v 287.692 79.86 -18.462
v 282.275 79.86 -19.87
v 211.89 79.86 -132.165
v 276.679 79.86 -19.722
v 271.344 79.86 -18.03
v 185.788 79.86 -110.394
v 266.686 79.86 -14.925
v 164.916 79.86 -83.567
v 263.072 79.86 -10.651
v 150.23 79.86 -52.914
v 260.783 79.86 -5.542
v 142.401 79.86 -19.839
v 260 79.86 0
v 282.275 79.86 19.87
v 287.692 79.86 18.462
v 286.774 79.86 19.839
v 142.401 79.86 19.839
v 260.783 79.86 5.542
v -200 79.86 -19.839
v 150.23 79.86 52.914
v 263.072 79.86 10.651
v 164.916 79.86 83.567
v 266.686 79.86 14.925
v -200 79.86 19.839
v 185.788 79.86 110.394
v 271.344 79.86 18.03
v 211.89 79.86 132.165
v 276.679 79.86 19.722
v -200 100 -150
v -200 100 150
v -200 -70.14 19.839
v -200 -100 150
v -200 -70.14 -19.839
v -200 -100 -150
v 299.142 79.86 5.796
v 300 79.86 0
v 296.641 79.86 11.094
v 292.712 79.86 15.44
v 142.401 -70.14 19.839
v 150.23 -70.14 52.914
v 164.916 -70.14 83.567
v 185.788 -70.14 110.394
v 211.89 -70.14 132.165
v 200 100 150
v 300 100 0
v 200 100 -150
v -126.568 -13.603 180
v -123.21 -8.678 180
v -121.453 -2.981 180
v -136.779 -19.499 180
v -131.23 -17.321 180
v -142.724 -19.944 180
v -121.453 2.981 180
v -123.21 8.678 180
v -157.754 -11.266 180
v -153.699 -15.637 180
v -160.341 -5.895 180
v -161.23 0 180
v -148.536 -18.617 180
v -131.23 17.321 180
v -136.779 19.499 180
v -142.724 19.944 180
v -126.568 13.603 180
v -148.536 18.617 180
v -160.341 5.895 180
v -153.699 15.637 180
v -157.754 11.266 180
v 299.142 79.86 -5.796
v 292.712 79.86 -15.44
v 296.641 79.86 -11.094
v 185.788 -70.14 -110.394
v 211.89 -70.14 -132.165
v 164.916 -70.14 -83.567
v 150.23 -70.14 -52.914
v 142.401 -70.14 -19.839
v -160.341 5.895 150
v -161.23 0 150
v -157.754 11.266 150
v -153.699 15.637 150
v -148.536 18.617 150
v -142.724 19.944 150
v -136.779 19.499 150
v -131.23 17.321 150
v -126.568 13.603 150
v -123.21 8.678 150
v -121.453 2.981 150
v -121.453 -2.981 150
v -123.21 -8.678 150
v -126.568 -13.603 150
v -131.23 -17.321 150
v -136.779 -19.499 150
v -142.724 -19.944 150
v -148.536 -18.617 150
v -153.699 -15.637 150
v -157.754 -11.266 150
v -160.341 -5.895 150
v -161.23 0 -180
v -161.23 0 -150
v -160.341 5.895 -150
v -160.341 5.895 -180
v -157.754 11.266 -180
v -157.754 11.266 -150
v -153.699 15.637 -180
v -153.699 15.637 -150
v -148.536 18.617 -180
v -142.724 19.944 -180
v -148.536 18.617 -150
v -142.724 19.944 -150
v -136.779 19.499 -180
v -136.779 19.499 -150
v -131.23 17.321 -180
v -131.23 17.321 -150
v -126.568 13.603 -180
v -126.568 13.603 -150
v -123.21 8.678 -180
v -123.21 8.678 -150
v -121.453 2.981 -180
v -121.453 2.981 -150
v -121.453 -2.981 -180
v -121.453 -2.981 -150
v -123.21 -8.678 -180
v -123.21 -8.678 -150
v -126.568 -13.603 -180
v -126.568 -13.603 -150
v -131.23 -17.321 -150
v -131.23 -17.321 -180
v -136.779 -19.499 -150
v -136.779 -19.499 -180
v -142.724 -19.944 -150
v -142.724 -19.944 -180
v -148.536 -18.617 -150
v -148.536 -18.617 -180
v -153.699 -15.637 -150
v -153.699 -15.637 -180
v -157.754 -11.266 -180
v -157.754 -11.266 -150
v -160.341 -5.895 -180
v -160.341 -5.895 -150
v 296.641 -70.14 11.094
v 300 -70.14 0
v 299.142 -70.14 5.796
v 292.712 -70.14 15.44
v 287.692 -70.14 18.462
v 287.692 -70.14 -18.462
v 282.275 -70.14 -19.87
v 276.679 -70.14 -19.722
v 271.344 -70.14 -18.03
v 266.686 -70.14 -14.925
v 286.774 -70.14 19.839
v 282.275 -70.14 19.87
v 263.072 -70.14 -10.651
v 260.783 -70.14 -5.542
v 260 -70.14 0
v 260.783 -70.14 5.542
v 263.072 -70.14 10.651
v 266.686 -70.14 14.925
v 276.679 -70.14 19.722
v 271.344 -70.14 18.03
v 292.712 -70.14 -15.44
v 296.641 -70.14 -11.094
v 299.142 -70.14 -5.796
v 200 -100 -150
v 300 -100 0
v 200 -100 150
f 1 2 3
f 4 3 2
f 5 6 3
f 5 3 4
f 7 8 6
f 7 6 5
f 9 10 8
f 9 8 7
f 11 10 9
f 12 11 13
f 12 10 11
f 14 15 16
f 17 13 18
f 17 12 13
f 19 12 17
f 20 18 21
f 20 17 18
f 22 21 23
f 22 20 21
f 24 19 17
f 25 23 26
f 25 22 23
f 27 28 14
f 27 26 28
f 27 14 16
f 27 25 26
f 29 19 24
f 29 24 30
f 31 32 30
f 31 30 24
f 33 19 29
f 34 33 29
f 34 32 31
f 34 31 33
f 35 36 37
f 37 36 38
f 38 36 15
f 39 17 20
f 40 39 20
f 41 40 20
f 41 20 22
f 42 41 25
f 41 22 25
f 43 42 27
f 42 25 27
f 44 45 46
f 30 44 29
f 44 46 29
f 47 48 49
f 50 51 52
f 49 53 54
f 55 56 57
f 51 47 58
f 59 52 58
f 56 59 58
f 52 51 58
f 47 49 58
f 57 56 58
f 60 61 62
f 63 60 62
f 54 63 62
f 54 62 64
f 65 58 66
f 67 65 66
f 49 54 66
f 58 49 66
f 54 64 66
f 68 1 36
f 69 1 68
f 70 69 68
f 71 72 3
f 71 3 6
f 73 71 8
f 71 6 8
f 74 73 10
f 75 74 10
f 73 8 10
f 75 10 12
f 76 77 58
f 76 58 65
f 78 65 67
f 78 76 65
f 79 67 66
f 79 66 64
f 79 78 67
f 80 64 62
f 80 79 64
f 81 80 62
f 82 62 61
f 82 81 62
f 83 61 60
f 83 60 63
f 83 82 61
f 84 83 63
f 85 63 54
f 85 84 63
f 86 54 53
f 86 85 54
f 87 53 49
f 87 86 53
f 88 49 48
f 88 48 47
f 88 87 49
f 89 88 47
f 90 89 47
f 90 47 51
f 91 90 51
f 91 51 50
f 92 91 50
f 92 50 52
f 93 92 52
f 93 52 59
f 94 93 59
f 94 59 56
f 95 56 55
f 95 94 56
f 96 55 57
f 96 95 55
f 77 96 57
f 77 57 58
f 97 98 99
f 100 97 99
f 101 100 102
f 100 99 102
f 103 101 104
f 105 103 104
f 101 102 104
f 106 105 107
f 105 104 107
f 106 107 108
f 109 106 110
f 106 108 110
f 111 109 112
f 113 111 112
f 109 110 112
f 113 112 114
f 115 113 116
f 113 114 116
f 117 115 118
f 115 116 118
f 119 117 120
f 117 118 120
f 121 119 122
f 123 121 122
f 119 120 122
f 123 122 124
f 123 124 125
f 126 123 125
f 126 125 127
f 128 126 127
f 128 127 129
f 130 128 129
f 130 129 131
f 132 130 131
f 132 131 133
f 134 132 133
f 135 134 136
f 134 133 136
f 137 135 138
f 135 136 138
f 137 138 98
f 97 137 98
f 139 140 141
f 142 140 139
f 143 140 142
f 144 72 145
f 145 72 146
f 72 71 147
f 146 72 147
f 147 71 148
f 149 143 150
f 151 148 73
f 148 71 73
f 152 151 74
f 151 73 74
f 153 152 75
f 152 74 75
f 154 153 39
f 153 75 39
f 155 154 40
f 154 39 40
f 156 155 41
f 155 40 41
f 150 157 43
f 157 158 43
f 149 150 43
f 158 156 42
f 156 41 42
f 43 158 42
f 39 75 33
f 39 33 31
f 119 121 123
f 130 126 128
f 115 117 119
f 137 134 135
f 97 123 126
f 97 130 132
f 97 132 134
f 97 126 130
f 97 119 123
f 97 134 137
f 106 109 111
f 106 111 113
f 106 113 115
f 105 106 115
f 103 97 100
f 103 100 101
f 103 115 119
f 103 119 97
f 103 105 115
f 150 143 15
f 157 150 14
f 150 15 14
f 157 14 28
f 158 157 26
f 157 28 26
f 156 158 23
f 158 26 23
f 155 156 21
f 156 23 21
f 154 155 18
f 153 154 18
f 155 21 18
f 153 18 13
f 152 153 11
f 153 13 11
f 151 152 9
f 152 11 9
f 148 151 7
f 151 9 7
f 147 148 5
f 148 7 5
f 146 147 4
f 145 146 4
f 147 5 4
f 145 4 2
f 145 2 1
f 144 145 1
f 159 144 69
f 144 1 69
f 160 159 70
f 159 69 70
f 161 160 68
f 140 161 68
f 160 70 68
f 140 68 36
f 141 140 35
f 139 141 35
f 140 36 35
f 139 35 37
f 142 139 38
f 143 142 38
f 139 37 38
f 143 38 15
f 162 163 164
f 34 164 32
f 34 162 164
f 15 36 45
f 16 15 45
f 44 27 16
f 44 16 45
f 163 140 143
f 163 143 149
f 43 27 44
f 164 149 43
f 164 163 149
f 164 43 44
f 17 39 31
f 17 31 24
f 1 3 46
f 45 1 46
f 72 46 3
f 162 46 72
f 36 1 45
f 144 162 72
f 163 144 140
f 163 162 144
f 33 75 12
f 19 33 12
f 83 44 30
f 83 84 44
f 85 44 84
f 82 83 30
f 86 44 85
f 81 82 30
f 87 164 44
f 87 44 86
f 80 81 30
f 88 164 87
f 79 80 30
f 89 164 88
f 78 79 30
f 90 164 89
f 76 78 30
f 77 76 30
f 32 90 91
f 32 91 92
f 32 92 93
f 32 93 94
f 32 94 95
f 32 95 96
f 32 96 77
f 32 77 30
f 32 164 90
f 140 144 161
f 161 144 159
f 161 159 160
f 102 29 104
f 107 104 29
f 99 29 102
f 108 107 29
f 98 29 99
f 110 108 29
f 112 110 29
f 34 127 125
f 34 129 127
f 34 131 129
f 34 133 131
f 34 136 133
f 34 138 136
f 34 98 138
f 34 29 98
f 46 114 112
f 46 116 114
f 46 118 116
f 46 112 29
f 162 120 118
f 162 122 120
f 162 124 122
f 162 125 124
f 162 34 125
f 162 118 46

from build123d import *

# Parameters (mm, degrees)
BOSS_EXTRUDE1_DEPTH      = 100
BOSS_EXTRUDE1_DEPTH_BACK = 100
SKETCH2_W                = 135
SKETCH2_H                = 150
CUT_REVOLVE1_ANGLE       = 112.6198649
SKETCH3_R                = 20
BOSS_EXTRUDE3_DEPTH      = 30
SKETCH4_W                = 39.677312781
SKETCH4_H                = 150
CUT_EXTRUDE2_DEPTH       = 500
SKETCH7_W                = 20
SKETCH7_H                = 150


with BuildPart() as part:
    # Sketch1 → Boss-Extrude1 (new, two sides: drawn at the far end of the back side and taken through both)
    with BuildSketch(Plane(origin=(0, 0, 0), x_dir=(1, 0, 0), z_dir=(0, 1, 0)).offset(-BOSS_EXTRUDE1_DEPTH_BACK)):
        Polygon((200, 150), (300, 0), (200, -150), (-200, -150), (-200, 150), align=None)
    extrude(amount=BOSS_EXTRUDE1_DEPTH + BOSS_EXTRUDE1_DEPTH_BACK)

    # Sketch2 → Cut-Revolve1 (revolve, cut)
    with BuildSketch(Plane(origin=(207.692307692, 0, -138.461538462), x_dir=(-0.5547001962252291, 0, -0.8320502943378437), z_dir=(0.8320502943378437, 0, -0.5547001962252291))):
        with Locations((-75.066961244, 4.860296888)):
            Rectangle(SKETCH2_W, SKETCH2_H)
    revolve(axis=Axis((300, -100, 0), (0, 1, 0)), revolution_arc=CUT_REVOLVE1_ANGLE, mode=Mode.SUBTRACT)

    # Sketch3 → Boss-Extrude3 (add)
    with BuildSketch(Plane(origin=(0, 0, -150), x_dir=(-1, 0, 0), z_dir=(0, 0, -1))):
        with Locations((141.22951379, 0)):
            Circle(SKETCH3_R)
    boss_extrude3 = extrude(amount=BOSS_EXTRUDE3_DEPTH)

    # Mirror1: Boss-Extrude3 across plane
    add(boss_extrude3.mirror(Plane(origin=(0, 0, 0), x_dir=(1, 0, 0), z_dir=(0, 0, -1))))

    # Sketch4 → Cut-Extrude2 (cut)
    with BuildSketch(Plane.ZY.offset(200)):
        with Locations((-6e-09, 4.860296888)):
            Rectangle(SKETCH4_W, SKETCH4_H)
    extrude(amount=-CUT_EXTRUDE2_DEPTH, mode=Mode.SUBTRACT)

    # Sketch7 → Revolve2 (revolve)
    with BuildSketch(Plane(origin=(0, 0, 0), x_dir=(-1, 0, 0), z_dir=(0, 0, -1))):
        with Locations((-290, 4.860296888)):
            Rectangle(SKETCH7_W, SKETCH7_H)
    revolve(axis=Axis((280, 79.860296888, 0), (0, -1, 0)))


solid = part.part
